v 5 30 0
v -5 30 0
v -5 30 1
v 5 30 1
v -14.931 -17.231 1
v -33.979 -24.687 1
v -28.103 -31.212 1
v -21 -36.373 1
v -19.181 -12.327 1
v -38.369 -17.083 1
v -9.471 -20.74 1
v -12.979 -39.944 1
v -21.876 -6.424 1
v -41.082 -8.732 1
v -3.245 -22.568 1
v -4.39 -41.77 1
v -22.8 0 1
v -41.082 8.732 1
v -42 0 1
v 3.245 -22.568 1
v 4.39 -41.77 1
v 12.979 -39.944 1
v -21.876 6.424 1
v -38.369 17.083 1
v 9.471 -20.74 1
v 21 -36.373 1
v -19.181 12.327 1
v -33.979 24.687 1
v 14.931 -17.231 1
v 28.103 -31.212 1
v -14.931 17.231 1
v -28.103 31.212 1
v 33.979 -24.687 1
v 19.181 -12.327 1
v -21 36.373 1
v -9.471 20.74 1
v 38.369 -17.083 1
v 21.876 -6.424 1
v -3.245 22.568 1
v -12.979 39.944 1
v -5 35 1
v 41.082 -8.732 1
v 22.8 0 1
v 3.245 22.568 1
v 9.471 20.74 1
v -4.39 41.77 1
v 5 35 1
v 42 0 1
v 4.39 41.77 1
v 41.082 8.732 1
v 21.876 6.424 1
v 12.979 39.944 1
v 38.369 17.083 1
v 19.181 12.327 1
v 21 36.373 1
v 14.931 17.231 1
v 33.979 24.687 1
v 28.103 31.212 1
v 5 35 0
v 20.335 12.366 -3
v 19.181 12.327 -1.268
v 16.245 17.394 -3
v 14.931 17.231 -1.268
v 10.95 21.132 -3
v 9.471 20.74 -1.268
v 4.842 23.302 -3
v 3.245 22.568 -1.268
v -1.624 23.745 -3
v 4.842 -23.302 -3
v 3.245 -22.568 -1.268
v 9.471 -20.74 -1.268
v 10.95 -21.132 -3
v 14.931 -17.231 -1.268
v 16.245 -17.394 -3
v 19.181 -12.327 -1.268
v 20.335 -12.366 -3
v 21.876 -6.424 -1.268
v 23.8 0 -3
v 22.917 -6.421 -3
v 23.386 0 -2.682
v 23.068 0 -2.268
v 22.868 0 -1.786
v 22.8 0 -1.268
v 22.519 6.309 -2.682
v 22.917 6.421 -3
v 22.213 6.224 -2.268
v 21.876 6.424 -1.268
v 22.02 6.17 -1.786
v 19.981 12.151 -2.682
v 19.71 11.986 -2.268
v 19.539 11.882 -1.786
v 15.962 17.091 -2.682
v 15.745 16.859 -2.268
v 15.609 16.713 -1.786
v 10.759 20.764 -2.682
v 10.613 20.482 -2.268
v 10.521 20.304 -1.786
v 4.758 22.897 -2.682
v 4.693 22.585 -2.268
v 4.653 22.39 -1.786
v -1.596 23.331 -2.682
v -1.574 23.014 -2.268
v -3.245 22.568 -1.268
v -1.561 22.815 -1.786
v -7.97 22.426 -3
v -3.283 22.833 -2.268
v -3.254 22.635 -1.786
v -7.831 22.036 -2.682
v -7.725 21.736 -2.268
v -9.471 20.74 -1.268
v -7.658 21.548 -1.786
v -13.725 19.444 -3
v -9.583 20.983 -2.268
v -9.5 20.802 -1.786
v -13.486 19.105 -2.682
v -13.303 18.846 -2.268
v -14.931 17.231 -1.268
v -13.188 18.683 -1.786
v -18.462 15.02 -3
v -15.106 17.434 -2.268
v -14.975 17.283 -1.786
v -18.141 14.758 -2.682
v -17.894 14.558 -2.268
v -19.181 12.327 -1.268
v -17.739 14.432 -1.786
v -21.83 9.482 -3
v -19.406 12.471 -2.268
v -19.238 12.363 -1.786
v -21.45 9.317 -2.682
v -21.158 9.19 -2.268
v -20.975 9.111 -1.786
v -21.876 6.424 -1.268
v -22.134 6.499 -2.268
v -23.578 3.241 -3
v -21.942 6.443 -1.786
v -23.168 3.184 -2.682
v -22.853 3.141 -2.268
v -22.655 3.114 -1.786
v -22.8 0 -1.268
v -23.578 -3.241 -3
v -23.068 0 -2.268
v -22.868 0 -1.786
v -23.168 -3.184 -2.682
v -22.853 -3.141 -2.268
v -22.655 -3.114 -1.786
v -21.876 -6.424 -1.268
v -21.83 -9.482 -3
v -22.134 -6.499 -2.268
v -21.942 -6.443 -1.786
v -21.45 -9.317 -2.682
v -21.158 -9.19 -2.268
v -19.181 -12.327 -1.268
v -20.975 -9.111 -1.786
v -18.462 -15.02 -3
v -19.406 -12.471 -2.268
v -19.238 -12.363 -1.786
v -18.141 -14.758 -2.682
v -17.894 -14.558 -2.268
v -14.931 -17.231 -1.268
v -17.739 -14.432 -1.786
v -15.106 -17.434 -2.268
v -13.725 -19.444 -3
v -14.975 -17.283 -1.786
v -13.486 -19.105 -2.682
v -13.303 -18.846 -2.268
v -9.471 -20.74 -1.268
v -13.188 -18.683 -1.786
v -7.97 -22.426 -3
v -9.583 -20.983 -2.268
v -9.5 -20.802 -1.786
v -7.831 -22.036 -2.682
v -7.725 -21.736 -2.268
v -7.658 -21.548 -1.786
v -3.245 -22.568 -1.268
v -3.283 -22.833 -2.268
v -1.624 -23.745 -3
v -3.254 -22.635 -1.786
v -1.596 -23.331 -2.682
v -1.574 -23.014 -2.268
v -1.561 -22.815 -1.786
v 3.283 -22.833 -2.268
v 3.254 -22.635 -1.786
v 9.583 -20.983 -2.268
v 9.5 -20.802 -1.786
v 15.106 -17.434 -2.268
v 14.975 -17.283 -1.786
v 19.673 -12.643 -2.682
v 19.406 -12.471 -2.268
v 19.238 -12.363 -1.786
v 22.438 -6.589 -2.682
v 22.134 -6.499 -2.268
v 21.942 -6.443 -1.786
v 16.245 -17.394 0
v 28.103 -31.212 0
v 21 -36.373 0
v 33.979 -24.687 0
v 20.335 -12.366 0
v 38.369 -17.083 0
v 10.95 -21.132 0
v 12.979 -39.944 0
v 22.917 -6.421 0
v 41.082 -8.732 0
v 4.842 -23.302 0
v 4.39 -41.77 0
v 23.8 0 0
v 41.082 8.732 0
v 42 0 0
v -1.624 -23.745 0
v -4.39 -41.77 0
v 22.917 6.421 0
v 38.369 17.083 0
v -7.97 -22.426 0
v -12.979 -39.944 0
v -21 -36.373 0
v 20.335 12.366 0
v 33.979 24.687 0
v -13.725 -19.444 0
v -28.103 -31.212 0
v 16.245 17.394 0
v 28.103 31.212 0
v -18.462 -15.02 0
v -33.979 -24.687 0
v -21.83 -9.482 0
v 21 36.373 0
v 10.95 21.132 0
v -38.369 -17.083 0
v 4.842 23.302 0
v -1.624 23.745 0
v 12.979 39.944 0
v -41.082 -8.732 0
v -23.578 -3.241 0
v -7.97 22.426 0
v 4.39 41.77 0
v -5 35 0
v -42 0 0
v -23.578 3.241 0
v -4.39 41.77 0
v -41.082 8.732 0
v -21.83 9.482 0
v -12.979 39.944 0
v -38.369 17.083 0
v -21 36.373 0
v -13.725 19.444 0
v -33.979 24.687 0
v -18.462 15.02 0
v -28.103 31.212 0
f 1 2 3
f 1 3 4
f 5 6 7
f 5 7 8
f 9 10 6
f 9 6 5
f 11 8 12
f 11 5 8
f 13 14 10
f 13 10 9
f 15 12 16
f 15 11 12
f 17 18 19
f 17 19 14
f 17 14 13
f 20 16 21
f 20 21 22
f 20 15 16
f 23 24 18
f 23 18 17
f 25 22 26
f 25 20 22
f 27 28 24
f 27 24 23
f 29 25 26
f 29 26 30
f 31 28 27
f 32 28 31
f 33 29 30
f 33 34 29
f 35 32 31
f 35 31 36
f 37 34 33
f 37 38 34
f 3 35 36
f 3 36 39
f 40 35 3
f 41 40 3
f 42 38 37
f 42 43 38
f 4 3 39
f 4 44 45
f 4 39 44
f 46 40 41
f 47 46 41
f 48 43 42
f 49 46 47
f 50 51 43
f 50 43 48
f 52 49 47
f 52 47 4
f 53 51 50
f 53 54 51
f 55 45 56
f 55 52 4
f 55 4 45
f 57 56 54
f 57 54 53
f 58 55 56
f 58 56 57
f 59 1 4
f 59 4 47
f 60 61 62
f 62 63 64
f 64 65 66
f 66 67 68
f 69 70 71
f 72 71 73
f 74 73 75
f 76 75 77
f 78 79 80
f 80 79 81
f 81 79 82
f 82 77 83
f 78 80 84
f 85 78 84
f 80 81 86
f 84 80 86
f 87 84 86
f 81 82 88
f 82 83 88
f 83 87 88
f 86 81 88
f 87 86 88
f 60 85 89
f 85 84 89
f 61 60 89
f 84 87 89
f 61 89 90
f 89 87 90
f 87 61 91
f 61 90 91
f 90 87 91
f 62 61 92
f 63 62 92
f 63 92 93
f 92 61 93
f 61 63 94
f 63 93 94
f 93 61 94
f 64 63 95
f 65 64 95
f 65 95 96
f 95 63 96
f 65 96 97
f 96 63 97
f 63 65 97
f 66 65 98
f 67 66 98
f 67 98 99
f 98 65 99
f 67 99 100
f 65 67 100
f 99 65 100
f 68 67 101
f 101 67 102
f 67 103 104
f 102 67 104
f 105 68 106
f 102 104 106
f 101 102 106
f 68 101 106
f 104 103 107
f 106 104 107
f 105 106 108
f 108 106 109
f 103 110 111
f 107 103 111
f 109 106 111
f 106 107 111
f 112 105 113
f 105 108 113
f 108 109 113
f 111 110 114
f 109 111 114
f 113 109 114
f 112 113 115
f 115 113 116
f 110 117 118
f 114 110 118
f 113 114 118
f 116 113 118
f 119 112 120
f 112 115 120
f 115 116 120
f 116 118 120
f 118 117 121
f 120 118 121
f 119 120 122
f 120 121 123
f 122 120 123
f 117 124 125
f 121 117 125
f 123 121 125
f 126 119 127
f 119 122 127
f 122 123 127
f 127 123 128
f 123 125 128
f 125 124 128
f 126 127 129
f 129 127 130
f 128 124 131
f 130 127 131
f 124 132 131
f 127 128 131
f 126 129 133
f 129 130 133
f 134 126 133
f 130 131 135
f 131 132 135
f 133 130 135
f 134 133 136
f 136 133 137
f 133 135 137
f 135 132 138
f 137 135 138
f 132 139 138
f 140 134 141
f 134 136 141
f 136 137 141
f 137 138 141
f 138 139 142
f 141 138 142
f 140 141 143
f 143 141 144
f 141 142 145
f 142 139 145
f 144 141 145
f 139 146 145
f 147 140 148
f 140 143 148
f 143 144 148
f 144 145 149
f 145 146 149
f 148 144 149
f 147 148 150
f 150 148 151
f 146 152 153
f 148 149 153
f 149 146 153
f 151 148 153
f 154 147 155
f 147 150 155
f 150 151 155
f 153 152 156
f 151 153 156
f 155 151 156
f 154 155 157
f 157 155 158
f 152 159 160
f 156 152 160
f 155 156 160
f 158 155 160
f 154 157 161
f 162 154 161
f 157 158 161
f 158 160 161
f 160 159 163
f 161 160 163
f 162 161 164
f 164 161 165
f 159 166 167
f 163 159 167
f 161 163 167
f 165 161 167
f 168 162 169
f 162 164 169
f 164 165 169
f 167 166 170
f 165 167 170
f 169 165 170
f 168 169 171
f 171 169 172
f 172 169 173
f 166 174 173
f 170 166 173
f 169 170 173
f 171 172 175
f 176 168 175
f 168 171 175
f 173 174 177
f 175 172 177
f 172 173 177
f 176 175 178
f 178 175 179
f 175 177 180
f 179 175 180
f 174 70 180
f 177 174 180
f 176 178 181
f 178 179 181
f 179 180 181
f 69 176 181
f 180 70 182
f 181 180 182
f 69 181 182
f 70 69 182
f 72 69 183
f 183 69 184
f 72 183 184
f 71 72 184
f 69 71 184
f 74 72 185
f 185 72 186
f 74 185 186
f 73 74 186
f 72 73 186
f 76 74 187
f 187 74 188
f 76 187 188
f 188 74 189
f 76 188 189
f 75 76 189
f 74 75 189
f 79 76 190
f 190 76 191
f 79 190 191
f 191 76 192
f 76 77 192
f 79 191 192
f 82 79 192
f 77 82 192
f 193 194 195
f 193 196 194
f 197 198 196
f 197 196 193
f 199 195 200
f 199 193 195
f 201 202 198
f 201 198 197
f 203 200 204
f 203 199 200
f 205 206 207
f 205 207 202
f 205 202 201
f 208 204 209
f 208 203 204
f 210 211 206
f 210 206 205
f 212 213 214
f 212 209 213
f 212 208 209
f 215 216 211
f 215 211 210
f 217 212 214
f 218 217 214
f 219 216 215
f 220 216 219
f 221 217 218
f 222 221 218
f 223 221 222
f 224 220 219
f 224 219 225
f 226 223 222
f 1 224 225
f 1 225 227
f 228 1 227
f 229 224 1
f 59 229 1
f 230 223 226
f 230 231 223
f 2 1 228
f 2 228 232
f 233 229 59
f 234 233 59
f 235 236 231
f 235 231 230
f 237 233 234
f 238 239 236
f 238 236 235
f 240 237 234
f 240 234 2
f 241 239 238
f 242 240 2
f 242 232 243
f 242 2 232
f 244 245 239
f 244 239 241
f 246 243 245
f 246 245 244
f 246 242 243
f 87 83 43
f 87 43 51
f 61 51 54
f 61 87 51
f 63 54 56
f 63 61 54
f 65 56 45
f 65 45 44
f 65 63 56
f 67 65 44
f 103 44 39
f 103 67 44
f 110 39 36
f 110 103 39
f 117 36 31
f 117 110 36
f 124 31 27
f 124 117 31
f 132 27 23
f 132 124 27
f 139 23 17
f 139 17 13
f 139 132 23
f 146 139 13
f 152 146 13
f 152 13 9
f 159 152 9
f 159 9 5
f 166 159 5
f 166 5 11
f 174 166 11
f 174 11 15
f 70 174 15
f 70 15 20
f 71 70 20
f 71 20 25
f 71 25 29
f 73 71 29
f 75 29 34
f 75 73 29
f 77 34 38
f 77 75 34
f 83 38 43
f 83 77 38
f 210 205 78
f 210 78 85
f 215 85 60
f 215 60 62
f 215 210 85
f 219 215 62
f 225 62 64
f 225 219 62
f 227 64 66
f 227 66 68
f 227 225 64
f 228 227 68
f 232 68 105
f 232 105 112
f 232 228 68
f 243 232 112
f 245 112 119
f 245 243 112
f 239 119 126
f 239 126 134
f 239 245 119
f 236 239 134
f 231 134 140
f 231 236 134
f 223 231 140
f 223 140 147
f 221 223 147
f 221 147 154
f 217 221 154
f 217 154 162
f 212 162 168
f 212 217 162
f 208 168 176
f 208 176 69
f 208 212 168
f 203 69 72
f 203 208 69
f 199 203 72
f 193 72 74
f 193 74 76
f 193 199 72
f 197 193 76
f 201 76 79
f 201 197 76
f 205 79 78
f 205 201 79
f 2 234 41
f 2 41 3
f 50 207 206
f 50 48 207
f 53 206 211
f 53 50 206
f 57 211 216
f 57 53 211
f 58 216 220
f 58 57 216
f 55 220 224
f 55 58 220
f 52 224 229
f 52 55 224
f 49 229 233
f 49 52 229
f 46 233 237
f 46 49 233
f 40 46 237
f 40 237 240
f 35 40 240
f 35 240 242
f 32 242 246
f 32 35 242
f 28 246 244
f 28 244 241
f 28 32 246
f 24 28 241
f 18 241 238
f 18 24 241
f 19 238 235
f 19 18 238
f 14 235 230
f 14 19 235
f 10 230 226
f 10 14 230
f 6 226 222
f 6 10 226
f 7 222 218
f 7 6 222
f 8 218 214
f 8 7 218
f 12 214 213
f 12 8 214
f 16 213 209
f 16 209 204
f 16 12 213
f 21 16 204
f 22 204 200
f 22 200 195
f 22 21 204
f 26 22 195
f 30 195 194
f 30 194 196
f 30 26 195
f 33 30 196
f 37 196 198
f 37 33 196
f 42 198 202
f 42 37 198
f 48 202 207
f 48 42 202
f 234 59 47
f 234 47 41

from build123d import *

# Parameters (mm, degrees)
F3_DEPTH = 25


# Not quite as in the source:
# - a fillet or chamfer that OpenCascade refuses, or shapes differently, is made with other operations: its cross-section is extruded or revolved along the edge and cut away or added


with BuildPart() as f1:
    # F0 (on Front) → F1 (revolve)
    with BuildSketch(Plane.XZ):
        Polygon((22.8, -3), (23.8, -3), (23.8, 0), (42, 0), (42, 1), (22.8, 1), align=None)
    revolve(axis=Axis((0, 0, 4.016155377), (0, 0, 1)))

    # F2 (on Top) → F3 (cut)
    with BuildSketch(Plane.XY):
        Polygon((-5, 30), (0, 30), (5, 30), (5, 35), (-5, 35), align=None)
    extrude(amount=F3_DEPTH, mode=Mode.SUBTRACT)

    # F4: fillet of radius 2 on 1 edges, made by hand

    # F4_s1 → F4_t2 (revolve, cut)
    with BuildSketch(Plane.XZ):
        with BuildLine():
            ThreePointArc((23.8, -3), (23.0679491924, -2.2679491924), (22.8, -1.2679491924))
            Line((22.8, -1.2679491924), (22.8, -3))
            Line((22.8, -3), (23.8, -3))
        make_face()
    revolve(axis=Axis((0, 0, -3), (0, 0, 1)), mode=Mode.SUBTRACT)


solid = f1.part
